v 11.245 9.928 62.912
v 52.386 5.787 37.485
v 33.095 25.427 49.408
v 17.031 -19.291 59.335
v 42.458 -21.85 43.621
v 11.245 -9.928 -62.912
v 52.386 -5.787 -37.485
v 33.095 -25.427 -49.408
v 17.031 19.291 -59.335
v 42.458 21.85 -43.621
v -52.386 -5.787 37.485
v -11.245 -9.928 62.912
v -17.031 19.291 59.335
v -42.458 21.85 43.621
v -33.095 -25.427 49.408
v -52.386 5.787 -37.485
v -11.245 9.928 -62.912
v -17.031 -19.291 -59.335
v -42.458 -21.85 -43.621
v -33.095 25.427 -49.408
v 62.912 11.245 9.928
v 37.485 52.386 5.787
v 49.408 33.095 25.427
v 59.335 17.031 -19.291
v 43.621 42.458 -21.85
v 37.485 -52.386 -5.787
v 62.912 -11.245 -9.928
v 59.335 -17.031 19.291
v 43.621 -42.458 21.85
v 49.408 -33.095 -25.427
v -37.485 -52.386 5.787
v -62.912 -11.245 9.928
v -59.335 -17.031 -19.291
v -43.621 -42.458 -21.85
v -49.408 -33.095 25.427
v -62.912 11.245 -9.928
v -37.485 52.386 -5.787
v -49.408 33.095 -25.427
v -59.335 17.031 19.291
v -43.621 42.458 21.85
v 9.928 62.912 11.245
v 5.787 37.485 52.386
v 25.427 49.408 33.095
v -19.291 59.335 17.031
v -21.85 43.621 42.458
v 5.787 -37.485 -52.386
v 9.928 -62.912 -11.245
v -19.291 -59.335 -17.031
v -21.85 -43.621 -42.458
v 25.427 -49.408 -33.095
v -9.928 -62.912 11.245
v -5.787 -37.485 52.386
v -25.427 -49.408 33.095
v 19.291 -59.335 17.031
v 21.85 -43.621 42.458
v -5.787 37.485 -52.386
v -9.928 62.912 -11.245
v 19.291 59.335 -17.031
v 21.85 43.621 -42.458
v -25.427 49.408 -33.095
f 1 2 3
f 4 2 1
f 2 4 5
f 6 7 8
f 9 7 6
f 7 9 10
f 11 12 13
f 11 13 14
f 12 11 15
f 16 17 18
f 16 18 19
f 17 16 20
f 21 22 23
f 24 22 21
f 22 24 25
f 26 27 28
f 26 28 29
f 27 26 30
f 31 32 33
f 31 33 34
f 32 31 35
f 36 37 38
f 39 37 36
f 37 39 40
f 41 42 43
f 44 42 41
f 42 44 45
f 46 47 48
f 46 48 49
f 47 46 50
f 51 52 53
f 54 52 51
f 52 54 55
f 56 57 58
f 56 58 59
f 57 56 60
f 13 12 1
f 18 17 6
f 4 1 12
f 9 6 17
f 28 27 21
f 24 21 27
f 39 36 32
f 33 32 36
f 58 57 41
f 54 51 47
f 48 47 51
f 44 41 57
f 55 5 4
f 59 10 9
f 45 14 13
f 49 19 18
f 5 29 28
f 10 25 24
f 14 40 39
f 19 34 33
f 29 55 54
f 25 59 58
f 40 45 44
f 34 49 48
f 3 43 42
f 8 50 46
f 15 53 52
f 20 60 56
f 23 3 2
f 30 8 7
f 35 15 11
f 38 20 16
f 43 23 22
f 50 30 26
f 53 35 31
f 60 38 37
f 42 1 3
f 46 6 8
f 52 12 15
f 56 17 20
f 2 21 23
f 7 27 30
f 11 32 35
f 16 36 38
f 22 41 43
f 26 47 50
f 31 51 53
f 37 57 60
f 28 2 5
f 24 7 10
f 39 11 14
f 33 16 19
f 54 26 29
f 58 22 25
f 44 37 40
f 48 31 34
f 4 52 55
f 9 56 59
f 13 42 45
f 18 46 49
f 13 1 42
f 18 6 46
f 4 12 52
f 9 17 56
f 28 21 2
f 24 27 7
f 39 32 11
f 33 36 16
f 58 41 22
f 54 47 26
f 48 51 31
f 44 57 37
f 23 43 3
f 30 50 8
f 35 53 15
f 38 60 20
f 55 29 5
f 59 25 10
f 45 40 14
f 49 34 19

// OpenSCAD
// Snub Dodecahedron
// (C) @oblomobka - 2024.09
// GPL license
//
// Data from    http://dmccooey.com/polyhedra/LsnubDodecahedron.txt
//              http://dmccooey.com/polyhedra/RsnubDodecahedron.txt
//              Copyright © 2015 David I. McCooey.

/* **CUSTOMIZER VARIABLES** */
// Edge
edge = 30; // [10:100]
// Center of the solid or stand over a face
position = "Center"; // ["Center", "Face"]
// Chiral
chiral = "Dextro"; //["Laevo", "Dextro"]


/* **MODULES** */
// Created with tribonacci constant
module SnubDodecahedron ( edge = 20, position = "Face", chiral = "Laevo"){ //sD -> Conway notation 

    // Constants
    phi = (1+sqrt(5))/2; // Golden ratio = 1,618...
    psi = ((phi + sqrt(phi-5/27))/2)^(1/3) + ((phi - sqrt(phi-5/27))/2)^(1/3); // 1.71556
    //tri = (1+(19-3*sqrt(33))^(1/3)+(19+3*sqrt(33))^(1/3))/3;  // Tribonacci constant = 1,839...
   
    // Invariants
    //rCirSnubCube = sqrt((1+1/tri^2)+tri^2); 
   
    // Variables
    C0  = phi * sqrt(3 - (psi^2)) / 2;
    C1  = psi * phi * sqrt(3 - (psi^2)) / 2;
    C2  = phi * sqrt((psi - 1 - (1/psi)) * phi) / 2;
    C3  = (psi^2) * phi * sqrt(3 - (psi^2)) / 2;
    C4  = psi * phi * sqrt((psi - 1 - (1/psi)) * phi) / 2;
    C5  = phi * sqrt(1 - psi + (1 + phi) / psi) / 2;
    C6  = phi * sqrt(psi + 1 - phi) / 2;
    C7  = (psi^2) * phi * sqrt((psi - 1 - (1/psi)) * phi) / 2;
    C8  = psi * phi * sqrt(1 - psi + (1 + phi) / psi) / 2;
    C9  = sqrt((psi + 2) * phi + 2) / 2;
    C10 = psi * sqrt(psi * (1 + phi) - phi) / 2;
    C11 = sqrt((psi^2) * (1 + 2 * phi) - phi) / 2;
    C12 = phi * sqrt((psi^2) + psi) / 2;
    C13 = (phi^2) * sqrt(psi * (psi + phi) + 1) / (2 * psi);
    C14 = phi * sqrt(psi * (psi + phi) + 1) / 2;
    
    // Definition of points and faces V = 60 / F = 92 ( 80 triangles + 12 pentagons )
    sDpoints=[
        [  C2,  -C1,  C14],
        [  C2,  +C1, -C14],
        [ -C2,  +C1,  C14],
        [ -C2,  -C1, -C14],
        [ C14,  -C2,   C1],
        [ C14,  +C2,  -C1],
        [-C14,  +C2,   C1],
        [-C14,  -C2,  -C1],
        [  C1, -C14,   C2],
        [  C1, +C14,  -C2],
        [ -C1, +C14,   C2],
        [ -C1, -C14,  -C2],
        [  C3,  +C4,  C13],
        [  C3,  -C4, -C13],
        [ -C3,  -C4,  C13],
        [ -C3,  +C4, -C13],
        [ C13,  +C3,   C4],
        [ C13,  -C3,  -C4],
        [-C13,  -C3,   C4],
        [-C13,  +C3,  -C4],
        [  C4, +C13,   C3],
        [  C4, -C13,  -C3],
        [ -C4, -C13,   C3],
        [ -C4, +C13,  -C3],
        [  C0,  -C8,  C12],
        [  C0,  +C8, -C12],
        [ -C0,  +C8,  C12],
        [ -C0,  -C8, -C12],
        [ C12,  -C0,   C8],
        [ C12,  +C0,  -C8],
        [-C12,  +C0,   C8],
        [-C12,  -C0,  -C8],
        [  C8, -C12,   C0],
        [  C8, +C12,  -C0],
        [ -C8, +C12,   C0],
        [ -C8, -C12,  -C0],
        [  C7,  -C6,  C11],
        [  C7,  +C6, -C11],
        [ -C7,  +C6,  C11],
        [ -C7,  -C6, -C11],
        [ C11,  -C7,   C6],
        [ C11,  +C7,  -C6],
        [-C11,  +C7,   C6],
        [-C11,  -C7,  -C6],
        [  C6, -C11,   C7],
        [  C6, +C11,  -C7],
        [ -C6, +C11,   C7],
        [ -C6, -C11,  -C7],
        [  C9,  +C5,  C10],
        [  C9,  -C5, -C10],
        [ -C9,  -C5,  C10],
        [ -C9,  +C5, -C10],
        [ C10,  +C9,   C5],
        [ C10,  -C9,  -C5],
        [-C10,  -C9,   C5],
        [-C10,  +C9,  -C5],
        [  C5, +C10,   C9],
        [  C5, -C10,  -C9],
        [ -C5, -C10,   C9],
        [ -C5, +C10,  -C9],
  
        [  C2,   C1,  C14],
        [  C2,  -C1, -C14],
        [ -C2,  -C1,  C14],
        [ -C2,   C1, -C14],
        [ C14,   C2,   C1],
        [ C14,  -C2,  -C1],
        [-C14,  -C2,   C1],
        [-C14,   C2,  -C1],
        [  C1,  C14,   C2],
        [  C1, -C14,  -C2],
        [ -C1, -C14,   C2],
        [ -C1,  C14,  -C2],
        [  C3,  -C4,  C13],
        [  C3,   C4, -C13],
        [ -C3,   C4,  C13],
        [ -C3,  -C4, -C13],
        [ C13,  -C3,   C4],
        [ C13,   C3,  -C4],
        [-C13,   C3,   C4],
        [-C13,  -C3,  -C4],
        [  C4, -C13,   C3],
        [  C4,  C13,  -C3],
        [ -C4,  C13,   C3],
        [ -C4, -C13,  -C3],
        [  C0,   C8,  C12],
        [  C0,  -C8, -C12],
        [ -C0,  -C8,  C12],
        [ -C0,   C8, -C12],
        [ C12,   C0,   C8],
        [ C12,  -C0,  -C8],
        [-C12,  -C0,   C8],
        [-C12,   C0,  -C8],
        [  C8,  C12,   C0],
        [  C8, -C12,  -C0],
        [ -C8, -C12,   C0],
        [ -C8,  C12,  -C0],
        [  C7,   C6,  C11],
        [  C7,  -C6, -C11],
        [ -C7,  -C6,  C11],
        [ -C7,   C6, -C11],
        [ C11,   C7,   C6],
        [ C11,  -C7,  -C6],
        [-C11,  -C7,   C6],
        [-C11,   C7,  -C6],
        [  C6,  C11,   C7],
        [  C6, -C11,  -C7],
        [ -C6, -C11,   C7],
        [ -C6,  C11,  -C7],
        [  C9,  -C5,  C10],
        [  C9,   C5, -C10],
        [ -C9,   C5,  C10],
        [ -C9,  -C5, -C10],
        [ C10,  -C9,   C5],
        [ C10,   C9,  -C5],
        [-C10,   C9,   C5],
        [-C10,  -C9,  -C5],
        [  C5, -C10,   C9],
        [  C5,  C10,  -C9],
        [ -C5,  C10,   C9],
        [ -C5, -C10,  -C9]      
        
    ];

sDfaceslaevo = [
    [  0, 12, 48, 28, 36 ],
    [  1, 13, 49, 29, 37 ],
    [  2, 14, 50, 30, 38 ],
    [  3, 15, 51, 31, 39 ],
    [  4, 17, 53, 32, 40 ],
    [  5, 16, 52, 33, 41 ],
    [  6, 19, 55, 34, 42 ],
    [  7, 18, 54, 35, 43 ],
    [  8, 22, 58, 24, 44 ],
    [  9, 23, 59, 25, 45 ],
    [ 10, 20, 56, 26, 46 ],
    [ 11, 21, 57, 27, 47 ],
    [  0, 14,  2 ],
    [  1, 15,  3 ],
    [  2, 12,  0 ],
    [  3, 13,  1 ],
    [  4, 16,  5 ],
    [  5, 17,  4 ],
    [  6, 18,  7 ],
    [  7, 19,  6 ],
    [  8, 21, 11 ],
    [  9, 20, 10 ],
    [ 10, 23,  9 ],
    [ 11, 22,  8 ],
    [ 12, 56, 48 ],
    [ 13, 57, 49 ],
    [ 14, 58, 50 ],
    [ 15, 59, 51 ],
    [ 16, 48, 52 ],
    [ 17, 49, 53 ],
    [ 18, 50, 54 ],
    [ 19, 51, 55 ],
    [ 20, 52, 56 ],
    [ 21, 53, 57 ],
    [ 22, 54, 58 ],
    [ 23, 55, 59 ],
    [ 24, 36, 44 ],
    [ 25, 37, 45 ],
    [ 26, 38, 46 ],
    [ 27, 39, 47 ],
    [ 28, 40, 36 ],
    [ 29, 41, 37 ],
    [ 30, 42, 38 ],
    [ 31, 43, 39 ],
    [ 32, 44, 40 ],
    [ 33, 45, 41 ],
    [ 34, 46, 42 ],
    [ 35, 47, 43 ],
    [ 36, 24,  0 ],
    [ 37, 25,  1 ],
    [ 38, 26,  2 ],
    [ 39, 27,  3 ],
    [ 40, 28,  4 ],
    [ 41, 29,  5 ],
    [ 42, 30,  6 ],
    [ 43, 31,  7 ],
    [ 44, 32,  8 ],
    [ 45, 33,  9 ],
    [ 46, 34, 10 ],
    [ 47, 35, 11 ],
    [ 48, 16, 28 ],
    [ 49, 17, 29 ],
    [ 50, 18, 30 ],
    [ 51, 19, 31 ],
    [ 52, 20, 33 ],
    [ 53, 21, 32 ],
    [ 54, 22, 35 ],
    [ 55, 23, 34 ],
    [ 56, 12, 26 ],
    [ 57, 13, 27 ],
    [ 58, 14, 24 ],
    [ 59, 15, 25 ],
    [ 24, 14,  0 ],
    [ 25, 15,  1 ],
    [ 26, 12,  2 ],
    [ 27, 13,  3 ],
    [ 28, 16,  4 ],
    [ 29, 17,  5 ],
    [ 30, 18,  6 ],
    [ 31, 19,  7 ],
    [ 32, 21,  8 ],
    [ 33, 20,  9 ],
    [ 34, 23, 10 ],
    [ 35, 22, 11 ],
    [ 36, 40, 44 ],
    [ 37, 41, 45 ],
    [ 38, 42, 46 ],
    [ 39, 43, 47 ],
    [ 48, 56, 52 ],
    [ 49, 57, 53 ],
    [ 50, 58, 54 ],
    [ 51, 59, 55 ]
];

sDfacesdextro = [
    [ 60, 96, 88,108, 72 ],
    [ 61, 97, 89, 109, 73 ],
    [ 62, 98, 90, 110, 74 ],
    [ 63, 99, 91, 111, 75 ],
    [ 64, 100, 92, 113, 77 ],
    [ 65, 101, 93, 112, 76 ],
    [ 66, 102, 94, 115, 79 ],
    [ 67, 103, 95, 114, 78 ],
    [ 68, 104, 84, 118, 82 ],
    [ 69, 105, 85, 119, 83 ],
    [ 70, 106, 86, 116, 80 ],
    [ 71, 107, 87, 117, 81 ],
    [ 60, 62, 74 ],
    [ 61, 63, 75 ],
    [ 62, 60, 72 ],
    [ 63, 61, 73 ],
    [ 64, 65, 76 ],
    [ 65, 64, 77 ],
    [ 66, 67, 78 ],
    [ 67, 66, 79 ],
    [ 68, 71, 81 ],
    [ 69, 70, 80 ],
    [ 70, 69, 83 ],
    [ 71, 68, 82 ],
    [ 72, 108, 116 ],
    [ 73, 109, 117 ],
    [ 74, 110, 118 ],
    [ 75, 111, 119 ],
    [ 76, 112, 108 ],
    [ 77, 113, 109 ],
    [ 78, 114, 110 ],
    [ 79, 115, 111 ],
    [ 80, 116, 112 ],
    [ 81, 117, 113 ],
    [ 82, 118, 114 ],
    [ 83, 119, 115 ],
    [ 84, 104, 96 ],
    [ 85, 105, 97 ],
    [ 86, 106, 98 ],
    [ 87, 107, 99 ],
    [ 88, 96, 100 ],
    [ 89, 97, 101 ],
    [ 90, 98, 102 ],
    [ 91, 99, 103 ],
    [ 92, 100, 104 ],
    [ 93, 101, 105 ],
    [ 94, 102, 106 ],
    [ 95, 103, 107 ],
    [ 96, 60, 84 ],
    [ 97, 61, 85 ],
    [ 98, 62, 86 ],
    [ 99, 63, 87 ],
    [ 100, 64, 88 ],
    [ 101, 65, 89 ],
    [ 102, 66, 90 ],
    [ 103, 67, 91 ],
    [ 104, 68, 92 ],
    [ 105, 69, 93 ],
    [ 106, 70, 94 ],
    [ 107, 71, 95 ],
    [ 108, 88, 76 ],
    [ 109, 89, 77 ],
    [ 110, 90, 78 ],
    [ 111, 91, 79 ],
    [ 112, 93, 80 ],
    [ 113, 92, 81 ],
    [ 114, 95, 82 ],
    [ 115, 94, 83 ],
    [ 116, 86, 72 ],
    [ 117, 87, 73 ],
    [ 118, 84, 74 ],
    [ 119, 85, 75 ],
    [ 84, 60, 74 ],
    [ 85, 61, 75 ],
    [ 86, 62, 72 ],
    [ 87, 63, 73 ],
    [ 88, 64, 76 ],
    [ 89, 65, 77 ],
    [ 90, 66, 78 ],
    [ 91, 67, 79 ],
    [ 92, 68, 81 ],
    [ 93, 69, 80 ],
    [ 94, 70, 83 ],
    [ 95, 71, 82 ],
    [ 96, 104, 100 ],
    [ 97, 105, 101 ],
    [ 98, 106, 102 ],
    [ 99, 107, 103 ],
    [ 108, 112, 116 ],
    [ 109, 113, 117 ],
    [ 110, 114, 118 ],
    [ 111, 115, 119 ]
];

    if ( chiral == "Laevo"){
                scale ([ edge, edge, edge])
                    polyhedron ( sDpoints, sDfaceslaevo);}

    else if ( chiral == "Dextro") {
                scale ([ edge, edge, edge])
                    polyhedron ( sDpoints, sDfacesdextro);       
        }
    
    echo (psi);

}

/* **RENDERING OF SOLIDS** */
SnubDodecahedron ( edge = edge, position = position, chiral = chiral);
//SnubDodecahedron ( edge = edge, position = position, chiral = "Dextro");
